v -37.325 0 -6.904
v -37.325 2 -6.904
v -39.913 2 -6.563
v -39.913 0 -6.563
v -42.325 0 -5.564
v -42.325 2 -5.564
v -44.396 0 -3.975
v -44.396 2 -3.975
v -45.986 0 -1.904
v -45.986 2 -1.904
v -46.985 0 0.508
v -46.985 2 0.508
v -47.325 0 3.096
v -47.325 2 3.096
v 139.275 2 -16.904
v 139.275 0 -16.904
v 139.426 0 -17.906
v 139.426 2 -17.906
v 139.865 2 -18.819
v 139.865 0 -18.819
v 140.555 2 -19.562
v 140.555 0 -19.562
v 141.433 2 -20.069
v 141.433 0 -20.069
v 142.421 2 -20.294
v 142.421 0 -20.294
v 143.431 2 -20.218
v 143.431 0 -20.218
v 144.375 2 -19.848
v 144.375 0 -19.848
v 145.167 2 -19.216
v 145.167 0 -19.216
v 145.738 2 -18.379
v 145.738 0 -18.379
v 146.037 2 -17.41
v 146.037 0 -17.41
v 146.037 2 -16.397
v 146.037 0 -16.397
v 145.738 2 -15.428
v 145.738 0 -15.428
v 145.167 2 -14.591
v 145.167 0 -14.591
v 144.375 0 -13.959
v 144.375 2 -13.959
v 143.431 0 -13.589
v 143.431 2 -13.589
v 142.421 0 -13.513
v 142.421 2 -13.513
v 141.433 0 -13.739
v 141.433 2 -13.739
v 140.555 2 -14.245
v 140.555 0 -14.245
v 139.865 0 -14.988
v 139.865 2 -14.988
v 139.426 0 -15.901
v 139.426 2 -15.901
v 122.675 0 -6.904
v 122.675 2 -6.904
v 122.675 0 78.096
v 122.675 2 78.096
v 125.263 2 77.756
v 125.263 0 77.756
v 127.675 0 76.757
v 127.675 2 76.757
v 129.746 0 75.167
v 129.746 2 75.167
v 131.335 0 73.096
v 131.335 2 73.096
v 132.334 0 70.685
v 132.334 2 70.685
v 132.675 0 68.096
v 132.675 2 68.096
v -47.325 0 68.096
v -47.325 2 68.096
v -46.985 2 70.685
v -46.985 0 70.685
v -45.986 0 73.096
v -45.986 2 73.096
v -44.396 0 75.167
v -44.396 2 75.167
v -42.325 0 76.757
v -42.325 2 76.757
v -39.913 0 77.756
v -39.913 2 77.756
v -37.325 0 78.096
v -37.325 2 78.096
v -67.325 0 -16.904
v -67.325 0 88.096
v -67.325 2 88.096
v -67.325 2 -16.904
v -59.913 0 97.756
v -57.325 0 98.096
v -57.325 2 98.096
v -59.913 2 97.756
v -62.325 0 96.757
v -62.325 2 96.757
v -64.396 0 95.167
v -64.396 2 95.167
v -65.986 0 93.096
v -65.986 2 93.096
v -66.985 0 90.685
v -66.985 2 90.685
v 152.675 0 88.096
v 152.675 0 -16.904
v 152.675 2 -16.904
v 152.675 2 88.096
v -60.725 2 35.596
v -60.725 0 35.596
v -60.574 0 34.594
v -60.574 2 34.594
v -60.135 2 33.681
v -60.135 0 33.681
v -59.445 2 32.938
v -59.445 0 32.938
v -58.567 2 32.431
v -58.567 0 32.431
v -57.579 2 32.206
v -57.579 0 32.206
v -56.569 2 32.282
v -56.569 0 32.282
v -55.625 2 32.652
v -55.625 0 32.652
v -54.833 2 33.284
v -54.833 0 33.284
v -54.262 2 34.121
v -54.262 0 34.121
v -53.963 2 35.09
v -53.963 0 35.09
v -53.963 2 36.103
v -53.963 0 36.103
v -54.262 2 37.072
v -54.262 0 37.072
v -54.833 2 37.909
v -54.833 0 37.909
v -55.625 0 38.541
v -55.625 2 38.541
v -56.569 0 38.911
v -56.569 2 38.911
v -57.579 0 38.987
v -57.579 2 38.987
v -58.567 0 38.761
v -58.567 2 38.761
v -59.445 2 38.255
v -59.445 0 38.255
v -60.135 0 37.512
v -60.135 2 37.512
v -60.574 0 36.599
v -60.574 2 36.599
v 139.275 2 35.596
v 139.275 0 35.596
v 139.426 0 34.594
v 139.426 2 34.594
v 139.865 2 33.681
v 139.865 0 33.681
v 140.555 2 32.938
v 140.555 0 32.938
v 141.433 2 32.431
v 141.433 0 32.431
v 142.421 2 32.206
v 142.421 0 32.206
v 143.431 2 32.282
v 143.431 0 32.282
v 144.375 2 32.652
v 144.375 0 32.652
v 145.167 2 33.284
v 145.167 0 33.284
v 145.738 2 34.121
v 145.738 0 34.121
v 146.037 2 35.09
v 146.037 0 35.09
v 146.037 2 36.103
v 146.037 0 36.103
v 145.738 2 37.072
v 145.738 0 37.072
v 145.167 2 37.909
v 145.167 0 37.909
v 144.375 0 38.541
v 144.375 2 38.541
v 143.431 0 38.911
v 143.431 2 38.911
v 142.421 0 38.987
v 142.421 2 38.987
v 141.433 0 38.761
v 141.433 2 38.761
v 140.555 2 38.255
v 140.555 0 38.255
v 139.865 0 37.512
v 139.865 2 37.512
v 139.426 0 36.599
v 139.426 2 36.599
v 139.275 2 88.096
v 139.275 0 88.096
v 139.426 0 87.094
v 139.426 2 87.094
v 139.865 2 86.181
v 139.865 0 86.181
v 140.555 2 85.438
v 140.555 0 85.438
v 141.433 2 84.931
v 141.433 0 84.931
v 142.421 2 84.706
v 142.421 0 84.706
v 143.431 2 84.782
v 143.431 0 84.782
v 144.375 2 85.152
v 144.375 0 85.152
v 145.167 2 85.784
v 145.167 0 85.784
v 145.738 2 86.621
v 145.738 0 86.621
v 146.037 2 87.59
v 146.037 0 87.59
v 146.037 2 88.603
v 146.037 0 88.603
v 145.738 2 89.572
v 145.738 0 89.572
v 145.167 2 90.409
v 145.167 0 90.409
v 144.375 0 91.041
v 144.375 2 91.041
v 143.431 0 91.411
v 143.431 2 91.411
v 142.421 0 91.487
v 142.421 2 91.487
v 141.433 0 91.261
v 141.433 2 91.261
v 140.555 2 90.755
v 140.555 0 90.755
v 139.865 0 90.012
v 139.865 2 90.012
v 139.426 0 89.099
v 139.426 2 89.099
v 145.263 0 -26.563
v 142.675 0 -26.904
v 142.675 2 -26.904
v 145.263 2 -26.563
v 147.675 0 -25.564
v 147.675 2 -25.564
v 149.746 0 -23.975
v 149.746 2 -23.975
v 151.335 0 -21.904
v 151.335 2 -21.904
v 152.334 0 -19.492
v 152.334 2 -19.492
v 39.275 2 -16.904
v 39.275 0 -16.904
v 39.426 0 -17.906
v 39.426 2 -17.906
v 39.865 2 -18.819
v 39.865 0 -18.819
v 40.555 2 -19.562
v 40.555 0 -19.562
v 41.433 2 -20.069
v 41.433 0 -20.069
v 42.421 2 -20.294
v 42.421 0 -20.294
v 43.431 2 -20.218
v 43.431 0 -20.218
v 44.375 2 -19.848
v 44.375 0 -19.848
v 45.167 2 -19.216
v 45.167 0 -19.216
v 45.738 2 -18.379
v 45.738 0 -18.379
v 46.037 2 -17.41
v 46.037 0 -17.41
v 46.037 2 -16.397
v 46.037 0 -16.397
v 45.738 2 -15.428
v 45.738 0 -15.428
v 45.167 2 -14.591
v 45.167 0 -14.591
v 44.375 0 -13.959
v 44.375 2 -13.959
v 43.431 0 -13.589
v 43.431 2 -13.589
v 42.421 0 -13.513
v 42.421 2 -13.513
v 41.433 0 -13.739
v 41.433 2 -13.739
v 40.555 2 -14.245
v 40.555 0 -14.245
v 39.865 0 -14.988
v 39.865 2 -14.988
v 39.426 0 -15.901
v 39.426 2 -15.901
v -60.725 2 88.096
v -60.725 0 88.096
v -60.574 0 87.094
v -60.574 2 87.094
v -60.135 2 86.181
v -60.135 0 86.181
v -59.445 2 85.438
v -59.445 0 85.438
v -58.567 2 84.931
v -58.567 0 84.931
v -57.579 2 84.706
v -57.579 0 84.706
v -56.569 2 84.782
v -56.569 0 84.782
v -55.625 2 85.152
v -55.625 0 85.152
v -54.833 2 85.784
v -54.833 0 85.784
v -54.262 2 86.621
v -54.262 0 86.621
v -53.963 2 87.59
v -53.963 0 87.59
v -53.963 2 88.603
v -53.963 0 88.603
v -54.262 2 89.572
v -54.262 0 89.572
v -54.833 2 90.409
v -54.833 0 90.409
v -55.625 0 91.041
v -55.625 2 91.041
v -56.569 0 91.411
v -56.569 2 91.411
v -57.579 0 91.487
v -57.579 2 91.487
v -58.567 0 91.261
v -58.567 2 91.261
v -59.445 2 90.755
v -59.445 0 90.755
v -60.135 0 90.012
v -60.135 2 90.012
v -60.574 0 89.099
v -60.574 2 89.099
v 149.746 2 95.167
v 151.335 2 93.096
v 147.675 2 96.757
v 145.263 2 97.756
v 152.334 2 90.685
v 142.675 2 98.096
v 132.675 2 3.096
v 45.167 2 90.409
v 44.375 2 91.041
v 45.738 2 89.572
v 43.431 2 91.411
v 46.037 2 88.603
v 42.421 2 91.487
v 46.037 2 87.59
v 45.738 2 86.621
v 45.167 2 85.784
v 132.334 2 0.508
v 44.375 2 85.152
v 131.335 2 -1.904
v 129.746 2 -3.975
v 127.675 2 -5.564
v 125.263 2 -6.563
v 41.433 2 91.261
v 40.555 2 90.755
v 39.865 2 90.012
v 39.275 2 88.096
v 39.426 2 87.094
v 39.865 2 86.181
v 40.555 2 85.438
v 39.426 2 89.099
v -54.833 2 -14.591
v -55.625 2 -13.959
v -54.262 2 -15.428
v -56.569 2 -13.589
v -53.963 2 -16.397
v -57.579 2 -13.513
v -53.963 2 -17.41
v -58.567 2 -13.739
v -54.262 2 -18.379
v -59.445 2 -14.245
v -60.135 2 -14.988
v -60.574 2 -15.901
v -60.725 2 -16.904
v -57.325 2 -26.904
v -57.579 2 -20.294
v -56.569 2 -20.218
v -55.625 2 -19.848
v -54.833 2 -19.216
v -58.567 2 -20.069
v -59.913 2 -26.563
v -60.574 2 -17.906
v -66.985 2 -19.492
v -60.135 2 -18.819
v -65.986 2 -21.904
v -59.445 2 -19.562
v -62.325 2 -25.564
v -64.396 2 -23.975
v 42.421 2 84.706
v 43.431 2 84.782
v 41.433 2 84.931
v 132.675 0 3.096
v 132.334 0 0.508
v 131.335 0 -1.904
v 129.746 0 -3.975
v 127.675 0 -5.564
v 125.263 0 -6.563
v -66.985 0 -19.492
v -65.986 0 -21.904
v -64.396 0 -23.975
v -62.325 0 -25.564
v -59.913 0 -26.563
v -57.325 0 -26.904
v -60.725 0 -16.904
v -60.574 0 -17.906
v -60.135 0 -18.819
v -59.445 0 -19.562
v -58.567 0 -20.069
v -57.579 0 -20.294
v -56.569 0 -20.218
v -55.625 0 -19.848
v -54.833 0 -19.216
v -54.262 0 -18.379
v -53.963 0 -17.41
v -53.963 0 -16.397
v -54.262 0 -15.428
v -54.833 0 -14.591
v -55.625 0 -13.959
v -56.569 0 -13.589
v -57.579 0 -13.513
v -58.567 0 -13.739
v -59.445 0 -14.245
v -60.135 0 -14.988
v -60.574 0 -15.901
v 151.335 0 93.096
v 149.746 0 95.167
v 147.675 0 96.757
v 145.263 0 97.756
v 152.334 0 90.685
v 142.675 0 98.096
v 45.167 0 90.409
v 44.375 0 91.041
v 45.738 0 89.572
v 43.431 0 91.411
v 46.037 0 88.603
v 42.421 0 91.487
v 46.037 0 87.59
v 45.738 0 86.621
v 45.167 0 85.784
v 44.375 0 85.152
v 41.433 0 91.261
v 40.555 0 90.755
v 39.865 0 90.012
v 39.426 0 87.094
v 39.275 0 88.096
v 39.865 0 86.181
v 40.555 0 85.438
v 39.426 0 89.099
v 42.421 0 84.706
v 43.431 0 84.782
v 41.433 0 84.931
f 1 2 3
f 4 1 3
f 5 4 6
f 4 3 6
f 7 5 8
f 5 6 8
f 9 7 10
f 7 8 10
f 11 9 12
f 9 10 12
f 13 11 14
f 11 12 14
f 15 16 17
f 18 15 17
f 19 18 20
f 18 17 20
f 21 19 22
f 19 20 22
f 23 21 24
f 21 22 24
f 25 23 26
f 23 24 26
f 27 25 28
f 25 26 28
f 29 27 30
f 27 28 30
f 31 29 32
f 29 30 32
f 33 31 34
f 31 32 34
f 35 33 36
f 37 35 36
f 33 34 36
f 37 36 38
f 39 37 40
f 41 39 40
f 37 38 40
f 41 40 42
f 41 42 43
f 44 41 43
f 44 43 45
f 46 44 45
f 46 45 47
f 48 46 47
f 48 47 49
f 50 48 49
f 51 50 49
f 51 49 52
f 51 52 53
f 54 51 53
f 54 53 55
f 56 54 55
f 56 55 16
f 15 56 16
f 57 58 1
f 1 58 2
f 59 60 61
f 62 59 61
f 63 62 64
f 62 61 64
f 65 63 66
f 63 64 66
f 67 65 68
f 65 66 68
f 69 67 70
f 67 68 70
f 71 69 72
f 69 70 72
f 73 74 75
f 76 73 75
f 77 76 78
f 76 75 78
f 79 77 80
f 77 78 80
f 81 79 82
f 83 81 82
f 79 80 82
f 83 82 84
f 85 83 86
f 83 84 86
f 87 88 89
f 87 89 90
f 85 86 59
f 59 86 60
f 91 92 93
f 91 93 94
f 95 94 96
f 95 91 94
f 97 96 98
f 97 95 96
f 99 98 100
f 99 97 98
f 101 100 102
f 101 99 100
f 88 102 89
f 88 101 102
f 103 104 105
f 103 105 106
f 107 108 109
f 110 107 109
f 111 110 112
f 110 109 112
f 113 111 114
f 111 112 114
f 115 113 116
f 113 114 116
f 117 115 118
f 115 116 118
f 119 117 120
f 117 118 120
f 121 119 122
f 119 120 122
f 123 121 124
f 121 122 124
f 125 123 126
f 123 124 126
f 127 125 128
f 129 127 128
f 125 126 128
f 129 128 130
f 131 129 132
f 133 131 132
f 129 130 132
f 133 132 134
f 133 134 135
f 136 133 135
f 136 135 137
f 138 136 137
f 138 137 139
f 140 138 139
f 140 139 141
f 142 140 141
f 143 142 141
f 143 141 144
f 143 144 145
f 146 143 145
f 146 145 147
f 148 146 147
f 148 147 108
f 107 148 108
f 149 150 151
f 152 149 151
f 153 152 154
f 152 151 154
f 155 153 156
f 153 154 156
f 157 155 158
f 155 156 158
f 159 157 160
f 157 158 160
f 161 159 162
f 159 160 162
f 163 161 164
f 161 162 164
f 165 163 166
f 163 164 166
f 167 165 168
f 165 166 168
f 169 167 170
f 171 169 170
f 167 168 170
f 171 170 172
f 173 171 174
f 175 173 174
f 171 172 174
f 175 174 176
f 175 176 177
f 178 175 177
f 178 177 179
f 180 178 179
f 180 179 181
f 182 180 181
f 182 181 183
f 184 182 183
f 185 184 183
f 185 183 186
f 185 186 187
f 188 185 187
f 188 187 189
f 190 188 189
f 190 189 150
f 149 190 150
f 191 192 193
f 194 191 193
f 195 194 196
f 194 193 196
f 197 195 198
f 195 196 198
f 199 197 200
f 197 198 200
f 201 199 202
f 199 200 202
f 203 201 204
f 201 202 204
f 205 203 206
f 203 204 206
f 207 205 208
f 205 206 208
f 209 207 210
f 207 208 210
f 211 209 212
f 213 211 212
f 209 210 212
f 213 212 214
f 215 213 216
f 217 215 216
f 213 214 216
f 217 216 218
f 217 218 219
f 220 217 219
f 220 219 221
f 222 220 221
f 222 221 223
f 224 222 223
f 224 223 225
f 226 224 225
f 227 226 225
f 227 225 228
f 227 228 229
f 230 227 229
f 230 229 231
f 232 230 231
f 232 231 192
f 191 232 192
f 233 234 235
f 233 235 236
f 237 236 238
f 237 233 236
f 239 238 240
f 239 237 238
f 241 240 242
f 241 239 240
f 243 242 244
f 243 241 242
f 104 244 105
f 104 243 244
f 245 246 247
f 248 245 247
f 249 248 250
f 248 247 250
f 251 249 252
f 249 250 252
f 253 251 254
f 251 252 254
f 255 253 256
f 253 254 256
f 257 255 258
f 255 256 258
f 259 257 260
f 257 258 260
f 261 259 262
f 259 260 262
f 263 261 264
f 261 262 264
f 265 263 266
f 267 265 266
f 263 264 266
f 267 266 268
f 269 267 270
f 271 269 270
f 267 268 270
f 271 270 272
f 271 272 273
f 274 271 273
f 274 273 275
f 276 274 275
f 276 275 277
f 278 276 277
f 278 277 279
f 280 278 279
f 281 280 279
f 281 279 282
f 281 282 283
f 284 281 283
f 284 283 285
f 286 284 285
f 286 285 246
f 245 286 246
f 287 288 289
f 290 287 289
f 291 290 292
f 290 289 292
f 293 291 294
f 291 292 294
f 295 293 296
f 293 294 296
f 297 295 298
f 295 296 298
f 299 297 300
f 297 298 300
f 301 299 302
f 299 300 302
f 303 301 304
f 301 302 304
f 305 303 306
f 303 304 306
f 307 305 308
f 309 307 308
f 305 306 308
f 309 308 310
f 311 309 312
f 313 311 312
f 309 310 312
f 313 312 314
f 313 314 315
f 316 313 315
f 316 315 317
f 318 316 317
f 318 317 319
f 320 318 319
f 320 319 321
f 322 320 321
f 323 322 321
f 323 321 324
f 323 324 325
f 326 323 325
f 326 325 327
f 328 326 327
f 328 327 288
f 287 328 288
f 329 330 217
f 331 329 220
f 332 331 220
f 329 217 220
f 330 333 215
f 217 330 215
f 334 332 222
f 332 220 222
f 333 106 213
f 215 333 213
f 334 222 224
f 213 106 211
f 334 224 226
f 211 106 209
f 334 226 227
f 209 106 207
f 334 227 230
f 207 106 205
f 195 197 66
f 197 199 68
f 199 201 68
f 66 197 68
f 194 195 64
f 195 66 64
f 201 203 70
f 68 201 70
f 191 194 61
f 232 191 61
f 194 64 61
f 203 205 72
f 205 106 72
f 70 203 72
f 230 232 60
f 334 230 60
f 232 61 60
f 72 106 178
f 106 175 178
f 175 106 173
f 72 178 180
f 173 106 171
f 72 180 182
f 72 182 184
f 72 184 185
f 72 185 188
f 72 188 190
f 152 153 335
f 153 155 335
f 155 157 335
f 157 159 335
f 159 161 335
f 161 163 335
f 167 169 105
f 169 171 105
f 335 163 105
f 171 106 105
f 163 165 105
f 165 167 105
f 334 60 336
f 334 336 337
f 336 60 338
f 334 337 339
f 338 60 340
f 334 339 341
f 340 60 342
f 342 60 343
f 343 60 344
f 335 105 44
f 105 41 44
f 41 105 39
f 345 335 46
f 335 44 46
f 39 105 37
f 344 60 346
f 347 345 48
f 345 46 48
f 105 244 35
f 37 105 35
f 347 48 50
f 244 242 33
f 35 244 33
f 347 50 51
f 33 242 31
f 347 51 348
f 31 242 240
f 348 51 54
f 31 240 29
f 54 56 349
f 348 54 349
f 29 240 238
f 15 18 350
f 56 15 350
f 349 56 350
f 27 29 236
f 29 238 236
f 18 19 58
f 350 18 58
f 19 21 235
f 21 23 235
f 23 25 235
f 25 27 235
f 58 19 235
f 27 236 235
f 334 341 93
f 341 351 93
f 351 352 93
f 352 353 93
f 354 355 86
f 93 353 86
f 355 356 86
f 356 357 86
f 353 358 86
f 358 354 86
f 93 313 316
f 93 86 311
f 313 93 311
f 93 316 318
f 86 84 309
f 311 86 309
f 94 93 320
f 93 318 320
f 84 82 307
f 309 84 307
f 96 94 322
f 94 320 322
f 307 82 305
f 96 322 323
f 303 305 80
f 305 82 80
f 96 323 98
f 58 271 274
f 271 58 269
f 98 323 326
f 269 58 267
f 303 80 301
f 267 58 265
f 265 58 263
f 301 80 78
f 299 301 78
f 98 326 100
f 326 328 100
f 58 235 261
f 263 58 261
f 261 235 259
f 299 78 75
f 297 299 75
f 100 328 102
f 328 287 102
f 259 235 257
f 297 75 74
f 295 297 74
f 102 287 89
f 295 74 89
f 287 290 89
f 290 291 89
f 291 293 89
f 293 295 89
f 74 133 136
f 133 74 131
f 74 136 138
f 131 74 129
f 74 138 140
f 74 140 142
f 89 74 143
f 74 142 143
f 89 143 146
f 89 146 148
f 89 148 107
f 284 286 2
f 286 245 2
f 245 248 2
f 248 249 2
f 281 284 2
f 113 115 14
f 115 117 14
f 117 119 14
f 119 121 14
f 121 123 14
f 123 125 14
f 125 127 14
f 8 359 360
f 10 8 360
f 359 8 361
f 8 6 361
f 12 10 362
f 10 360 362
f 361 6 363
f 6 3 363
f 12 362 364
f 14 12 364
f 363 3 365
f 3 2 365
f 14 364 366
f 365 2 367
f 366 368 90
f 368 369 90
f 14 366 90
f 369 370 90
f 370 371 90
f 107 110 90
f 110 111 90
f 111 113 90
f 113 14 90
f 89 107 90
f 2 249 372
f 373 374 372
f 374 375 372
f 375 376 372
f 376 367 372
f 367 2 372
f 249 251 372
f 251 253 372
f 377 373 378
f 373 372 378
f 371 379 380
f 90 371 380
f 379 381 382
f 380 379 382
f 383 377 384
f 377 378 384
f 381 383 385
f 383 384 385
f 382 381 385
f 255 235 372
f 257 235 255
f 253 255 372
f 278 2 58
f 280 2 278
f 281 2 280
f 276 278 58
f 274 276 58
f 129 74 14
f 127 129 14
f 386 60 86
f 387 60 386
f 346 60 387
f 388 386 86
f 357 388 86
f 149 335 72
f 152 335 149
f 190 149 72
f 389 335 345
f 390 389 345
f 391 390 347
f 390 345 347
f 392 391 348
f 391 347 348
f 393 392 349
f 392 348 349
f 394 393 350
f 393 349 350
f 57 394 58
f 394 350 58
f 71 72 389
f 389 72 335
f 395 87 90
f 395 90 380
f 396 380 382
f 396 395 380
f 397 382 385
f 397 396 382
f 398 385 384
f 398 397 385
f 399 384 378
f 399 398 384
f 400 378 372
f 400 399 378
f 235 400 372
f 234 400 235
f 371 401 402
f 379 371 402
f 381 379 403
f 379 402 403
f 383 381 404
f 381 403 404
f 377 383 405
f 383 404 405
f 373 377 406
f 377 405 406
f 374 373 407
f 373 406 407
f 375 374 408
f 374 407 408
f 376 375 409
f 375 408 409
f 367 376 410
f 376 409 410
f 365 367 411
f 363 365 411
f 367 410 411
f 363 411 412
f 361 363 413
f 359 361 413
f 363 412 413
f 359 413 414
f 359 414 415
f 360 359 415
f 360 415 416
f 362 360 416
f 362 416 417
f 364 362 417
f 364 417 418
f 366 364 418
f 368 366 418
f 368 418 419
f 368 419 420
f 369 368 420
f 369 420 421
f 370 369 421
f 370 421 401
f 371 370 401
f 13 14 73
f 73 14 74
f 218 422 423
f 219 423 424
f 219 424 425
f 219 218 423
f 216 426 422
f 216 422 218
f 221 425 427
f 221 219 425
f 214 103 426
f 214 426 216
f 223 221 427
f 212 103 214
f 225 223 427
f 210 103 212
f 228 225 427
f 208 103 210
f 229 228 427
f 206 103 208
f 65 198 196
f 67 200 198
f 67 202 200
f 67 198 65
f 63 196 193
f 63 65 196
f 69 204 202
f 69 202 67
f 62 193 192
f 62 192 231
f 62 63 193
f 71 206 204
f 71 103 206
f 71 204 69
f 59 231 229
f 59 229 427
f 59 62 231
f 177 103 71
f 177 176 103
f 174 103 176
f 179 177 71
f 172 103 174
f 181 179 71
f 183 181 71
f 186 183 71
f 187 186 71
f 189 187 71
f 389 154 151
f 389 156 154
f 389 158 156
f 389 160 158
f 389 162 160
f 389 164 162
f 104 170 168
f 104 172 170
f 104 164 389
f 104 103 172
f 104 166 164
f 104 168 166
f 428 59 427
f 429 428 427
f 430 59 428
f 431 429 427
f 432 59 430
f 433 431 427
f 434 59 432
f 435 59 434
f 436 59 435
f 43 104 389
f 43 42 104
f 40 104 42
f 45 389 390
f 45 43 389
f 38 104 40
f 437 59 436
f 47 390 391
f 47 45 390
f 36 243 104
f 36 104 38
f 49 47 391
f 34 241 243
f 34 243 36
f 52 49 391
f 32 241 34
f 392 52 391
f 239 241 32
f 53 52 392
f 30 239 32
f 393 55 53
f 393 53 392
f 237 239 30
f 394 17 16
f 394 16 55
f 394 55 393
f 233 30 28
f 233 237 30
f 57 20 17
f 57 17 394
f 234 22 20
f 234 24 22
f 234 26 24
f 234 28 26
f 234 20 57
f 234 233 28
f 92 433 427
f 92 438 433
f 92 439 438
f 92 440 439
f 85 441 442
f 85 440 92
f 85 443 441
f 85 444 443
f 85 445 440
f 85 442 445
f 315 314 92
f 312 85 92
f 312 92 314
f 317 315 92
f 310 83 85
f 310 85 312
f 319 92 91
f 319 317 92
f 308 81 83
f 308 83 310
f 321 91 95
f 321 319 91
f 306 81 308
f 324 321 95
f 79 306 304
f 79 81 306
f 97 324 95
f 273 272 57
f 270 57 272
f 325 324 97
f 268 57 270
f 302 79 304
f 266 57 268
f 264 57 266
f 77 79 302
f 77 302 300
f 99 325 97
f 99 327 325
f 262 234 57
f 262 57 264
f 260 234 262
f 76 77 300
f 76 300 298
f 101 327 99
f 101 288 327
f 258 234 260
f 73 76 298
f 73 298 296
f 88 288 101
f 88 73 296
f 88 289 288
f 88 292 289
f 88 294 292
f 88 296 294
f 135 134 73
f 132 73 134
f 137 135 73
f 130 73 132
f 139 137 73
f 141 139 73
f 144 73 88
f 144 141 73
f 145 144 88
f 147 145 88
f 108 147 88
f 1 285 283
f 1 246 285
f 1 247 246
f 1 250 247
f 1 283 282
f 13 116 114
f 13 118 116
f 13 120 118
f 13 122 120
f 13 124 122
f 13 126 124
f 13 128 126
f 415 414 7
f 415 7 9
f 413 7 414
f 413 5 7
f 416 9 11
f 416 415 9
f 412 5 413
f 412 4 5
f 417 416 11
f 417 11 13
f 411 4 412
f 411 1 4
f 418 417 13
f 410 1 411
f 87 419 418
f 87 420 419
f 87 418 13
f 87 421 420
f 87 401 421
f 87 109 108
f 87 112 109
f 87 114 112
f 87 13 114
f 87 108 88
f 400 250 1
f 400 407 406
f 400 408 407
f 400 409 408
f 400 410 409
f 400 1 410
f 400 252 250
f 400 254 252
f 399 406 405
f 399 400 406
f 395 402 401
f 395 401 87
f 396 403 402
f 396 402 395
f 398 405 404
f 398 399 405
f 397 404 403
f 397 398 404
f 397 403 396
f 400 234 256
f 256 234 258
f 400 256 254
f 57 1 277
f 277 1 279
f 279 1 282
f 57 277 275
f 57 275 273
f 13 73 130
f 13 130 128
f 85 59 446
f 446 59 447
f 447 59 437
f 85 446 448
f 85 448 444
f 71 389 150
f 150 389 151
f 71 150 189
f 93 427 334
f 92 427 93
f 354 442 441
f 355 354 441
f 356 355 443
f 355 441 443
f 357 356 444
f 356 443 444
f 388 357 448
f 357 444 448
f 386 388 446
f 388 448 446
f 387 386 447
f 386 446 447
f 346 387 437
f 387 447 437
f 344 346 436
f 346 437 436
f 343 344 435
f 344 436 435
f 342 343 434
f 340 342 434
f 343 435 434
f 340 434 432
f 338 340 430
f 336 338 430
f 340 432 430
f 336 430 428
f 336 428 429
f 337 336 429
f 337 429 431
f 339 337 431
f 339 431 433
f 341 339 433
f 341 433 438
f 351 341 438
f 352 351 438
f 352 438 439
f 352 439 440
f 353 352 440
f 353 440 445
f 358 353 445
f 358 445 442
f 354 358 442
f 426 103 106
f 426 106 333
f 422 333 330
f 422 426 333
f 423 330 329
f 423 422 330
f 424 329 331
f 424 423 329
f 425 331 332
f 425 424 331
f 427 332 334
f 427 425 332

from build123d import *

# Parameters (mm, degrees)
BOSS_EXTRUDE1_DEPTH = 2
M8_TAPPED_HOLE1_D   = 6.8
CUT_EXTRUDE1_DEPTH  = 2


with BuildPart() as part:
    # Sketch1 → Boss-Extrude1 (new body)
    with BuildSketch(Plane(origin=(0, 0, 0), x_dir=(1, 0, 0), z_dir=(0, 1, 0))):
        with BuildLine():
            Line((-57.325301205, 26.903614458), (142.674698795, 26.903614458))
            ThreePointArc((142.674698795, 26.903614458), (149.745766607, 23.97468227), (152.674698795, 16.903614458))
            Line((152.674698795, 16.903614458), (152.674698795, -88.096385542))
            ThreePointArc((152.674698795, -88.096385542), (149.745766607, -95.167453354), (142.674698795, -98.096385542))
            Line((142.674698795, -98.096385542), (-57.325301205, -98.096385542))
            ThreePointArc((-57.325301205, -98.096385542), (-64.396369017, -95.167453354), (-67.325301205, -88.096385542))
            Line((-67.325301205, -88.096385542), (-67.325301205, 16.903614458))
            ThreePointArc((-67.325301205, 16.903614458), (-64.396369017, 23.97468227), (-57.325301205, 26.903614458))
        make_face()
    extrude(amount=BOSS_EXTRUDE1_DEPTH)

    # M8 Tapped Hole1 (through all)
    with Locations(Plane(origin=(0, 2, 0), x_dir=(1, 0, 0), z_dir=(0, 1, 0))):
        with Locations((-57.325301205, 16.903614458), (142.674698795, 16.903614458), (-57.325301205, -88.096385542), (142.674698795, -88.096385542), (42.674698795, -88.096385542), (42.674698795, 16.903614458), (142.674698795, -35.596385542), (-57.325301205, -35.596385542)):
            Hole(M8_TAPPED_HOLE1_D / 2)

    # Sketch4 → Cut-Extrude1 (cut)
    with BuildSketch(Plane(origin=(0, 2, 0), x_dir=(1, 0, 0), z_dir=(0, 1, 0))):
        with BuildLine():
            Line((122.674698795, 6.903614458), (-37.325301205, 6.903614458))
            ThreePointArc((-37.325301205, 6.903614458), (-44.396369017, 3.97468227), (-47.325301205, -3.096385542))
            Line((-47.325301205, -3.096385542), (-47.325301205, -35.596385542))
            Line((-47.325301205, -35.596385542), (-47.325301205, -68.096385542))
            ThreePointArc((-47.325301205, -68.096385542), (-44.396369017, -75.167453354), (-37.325301205, -78.096385542))
            Line((-37.325301205, -78.096385542), (122.674698795, -78.096385542))
            ThreePointArc((122.674698795, -78.096385542), (129.745766607, -75.167453354), (132.674698795, -68.096385542))
            Line((132.674698795, -68.096385542), (132.674698795, -3.096385542))
            ThreePointArc((132.674698795, -3.096385542), (129.745766607, 3.97468227), (122.674698795, 6.903614458))
        make_face()
    extrude(amount=-CUT_EXTRUDE1_DEPTH, mode=Mode.SUBTRACT)


solid = part.part
